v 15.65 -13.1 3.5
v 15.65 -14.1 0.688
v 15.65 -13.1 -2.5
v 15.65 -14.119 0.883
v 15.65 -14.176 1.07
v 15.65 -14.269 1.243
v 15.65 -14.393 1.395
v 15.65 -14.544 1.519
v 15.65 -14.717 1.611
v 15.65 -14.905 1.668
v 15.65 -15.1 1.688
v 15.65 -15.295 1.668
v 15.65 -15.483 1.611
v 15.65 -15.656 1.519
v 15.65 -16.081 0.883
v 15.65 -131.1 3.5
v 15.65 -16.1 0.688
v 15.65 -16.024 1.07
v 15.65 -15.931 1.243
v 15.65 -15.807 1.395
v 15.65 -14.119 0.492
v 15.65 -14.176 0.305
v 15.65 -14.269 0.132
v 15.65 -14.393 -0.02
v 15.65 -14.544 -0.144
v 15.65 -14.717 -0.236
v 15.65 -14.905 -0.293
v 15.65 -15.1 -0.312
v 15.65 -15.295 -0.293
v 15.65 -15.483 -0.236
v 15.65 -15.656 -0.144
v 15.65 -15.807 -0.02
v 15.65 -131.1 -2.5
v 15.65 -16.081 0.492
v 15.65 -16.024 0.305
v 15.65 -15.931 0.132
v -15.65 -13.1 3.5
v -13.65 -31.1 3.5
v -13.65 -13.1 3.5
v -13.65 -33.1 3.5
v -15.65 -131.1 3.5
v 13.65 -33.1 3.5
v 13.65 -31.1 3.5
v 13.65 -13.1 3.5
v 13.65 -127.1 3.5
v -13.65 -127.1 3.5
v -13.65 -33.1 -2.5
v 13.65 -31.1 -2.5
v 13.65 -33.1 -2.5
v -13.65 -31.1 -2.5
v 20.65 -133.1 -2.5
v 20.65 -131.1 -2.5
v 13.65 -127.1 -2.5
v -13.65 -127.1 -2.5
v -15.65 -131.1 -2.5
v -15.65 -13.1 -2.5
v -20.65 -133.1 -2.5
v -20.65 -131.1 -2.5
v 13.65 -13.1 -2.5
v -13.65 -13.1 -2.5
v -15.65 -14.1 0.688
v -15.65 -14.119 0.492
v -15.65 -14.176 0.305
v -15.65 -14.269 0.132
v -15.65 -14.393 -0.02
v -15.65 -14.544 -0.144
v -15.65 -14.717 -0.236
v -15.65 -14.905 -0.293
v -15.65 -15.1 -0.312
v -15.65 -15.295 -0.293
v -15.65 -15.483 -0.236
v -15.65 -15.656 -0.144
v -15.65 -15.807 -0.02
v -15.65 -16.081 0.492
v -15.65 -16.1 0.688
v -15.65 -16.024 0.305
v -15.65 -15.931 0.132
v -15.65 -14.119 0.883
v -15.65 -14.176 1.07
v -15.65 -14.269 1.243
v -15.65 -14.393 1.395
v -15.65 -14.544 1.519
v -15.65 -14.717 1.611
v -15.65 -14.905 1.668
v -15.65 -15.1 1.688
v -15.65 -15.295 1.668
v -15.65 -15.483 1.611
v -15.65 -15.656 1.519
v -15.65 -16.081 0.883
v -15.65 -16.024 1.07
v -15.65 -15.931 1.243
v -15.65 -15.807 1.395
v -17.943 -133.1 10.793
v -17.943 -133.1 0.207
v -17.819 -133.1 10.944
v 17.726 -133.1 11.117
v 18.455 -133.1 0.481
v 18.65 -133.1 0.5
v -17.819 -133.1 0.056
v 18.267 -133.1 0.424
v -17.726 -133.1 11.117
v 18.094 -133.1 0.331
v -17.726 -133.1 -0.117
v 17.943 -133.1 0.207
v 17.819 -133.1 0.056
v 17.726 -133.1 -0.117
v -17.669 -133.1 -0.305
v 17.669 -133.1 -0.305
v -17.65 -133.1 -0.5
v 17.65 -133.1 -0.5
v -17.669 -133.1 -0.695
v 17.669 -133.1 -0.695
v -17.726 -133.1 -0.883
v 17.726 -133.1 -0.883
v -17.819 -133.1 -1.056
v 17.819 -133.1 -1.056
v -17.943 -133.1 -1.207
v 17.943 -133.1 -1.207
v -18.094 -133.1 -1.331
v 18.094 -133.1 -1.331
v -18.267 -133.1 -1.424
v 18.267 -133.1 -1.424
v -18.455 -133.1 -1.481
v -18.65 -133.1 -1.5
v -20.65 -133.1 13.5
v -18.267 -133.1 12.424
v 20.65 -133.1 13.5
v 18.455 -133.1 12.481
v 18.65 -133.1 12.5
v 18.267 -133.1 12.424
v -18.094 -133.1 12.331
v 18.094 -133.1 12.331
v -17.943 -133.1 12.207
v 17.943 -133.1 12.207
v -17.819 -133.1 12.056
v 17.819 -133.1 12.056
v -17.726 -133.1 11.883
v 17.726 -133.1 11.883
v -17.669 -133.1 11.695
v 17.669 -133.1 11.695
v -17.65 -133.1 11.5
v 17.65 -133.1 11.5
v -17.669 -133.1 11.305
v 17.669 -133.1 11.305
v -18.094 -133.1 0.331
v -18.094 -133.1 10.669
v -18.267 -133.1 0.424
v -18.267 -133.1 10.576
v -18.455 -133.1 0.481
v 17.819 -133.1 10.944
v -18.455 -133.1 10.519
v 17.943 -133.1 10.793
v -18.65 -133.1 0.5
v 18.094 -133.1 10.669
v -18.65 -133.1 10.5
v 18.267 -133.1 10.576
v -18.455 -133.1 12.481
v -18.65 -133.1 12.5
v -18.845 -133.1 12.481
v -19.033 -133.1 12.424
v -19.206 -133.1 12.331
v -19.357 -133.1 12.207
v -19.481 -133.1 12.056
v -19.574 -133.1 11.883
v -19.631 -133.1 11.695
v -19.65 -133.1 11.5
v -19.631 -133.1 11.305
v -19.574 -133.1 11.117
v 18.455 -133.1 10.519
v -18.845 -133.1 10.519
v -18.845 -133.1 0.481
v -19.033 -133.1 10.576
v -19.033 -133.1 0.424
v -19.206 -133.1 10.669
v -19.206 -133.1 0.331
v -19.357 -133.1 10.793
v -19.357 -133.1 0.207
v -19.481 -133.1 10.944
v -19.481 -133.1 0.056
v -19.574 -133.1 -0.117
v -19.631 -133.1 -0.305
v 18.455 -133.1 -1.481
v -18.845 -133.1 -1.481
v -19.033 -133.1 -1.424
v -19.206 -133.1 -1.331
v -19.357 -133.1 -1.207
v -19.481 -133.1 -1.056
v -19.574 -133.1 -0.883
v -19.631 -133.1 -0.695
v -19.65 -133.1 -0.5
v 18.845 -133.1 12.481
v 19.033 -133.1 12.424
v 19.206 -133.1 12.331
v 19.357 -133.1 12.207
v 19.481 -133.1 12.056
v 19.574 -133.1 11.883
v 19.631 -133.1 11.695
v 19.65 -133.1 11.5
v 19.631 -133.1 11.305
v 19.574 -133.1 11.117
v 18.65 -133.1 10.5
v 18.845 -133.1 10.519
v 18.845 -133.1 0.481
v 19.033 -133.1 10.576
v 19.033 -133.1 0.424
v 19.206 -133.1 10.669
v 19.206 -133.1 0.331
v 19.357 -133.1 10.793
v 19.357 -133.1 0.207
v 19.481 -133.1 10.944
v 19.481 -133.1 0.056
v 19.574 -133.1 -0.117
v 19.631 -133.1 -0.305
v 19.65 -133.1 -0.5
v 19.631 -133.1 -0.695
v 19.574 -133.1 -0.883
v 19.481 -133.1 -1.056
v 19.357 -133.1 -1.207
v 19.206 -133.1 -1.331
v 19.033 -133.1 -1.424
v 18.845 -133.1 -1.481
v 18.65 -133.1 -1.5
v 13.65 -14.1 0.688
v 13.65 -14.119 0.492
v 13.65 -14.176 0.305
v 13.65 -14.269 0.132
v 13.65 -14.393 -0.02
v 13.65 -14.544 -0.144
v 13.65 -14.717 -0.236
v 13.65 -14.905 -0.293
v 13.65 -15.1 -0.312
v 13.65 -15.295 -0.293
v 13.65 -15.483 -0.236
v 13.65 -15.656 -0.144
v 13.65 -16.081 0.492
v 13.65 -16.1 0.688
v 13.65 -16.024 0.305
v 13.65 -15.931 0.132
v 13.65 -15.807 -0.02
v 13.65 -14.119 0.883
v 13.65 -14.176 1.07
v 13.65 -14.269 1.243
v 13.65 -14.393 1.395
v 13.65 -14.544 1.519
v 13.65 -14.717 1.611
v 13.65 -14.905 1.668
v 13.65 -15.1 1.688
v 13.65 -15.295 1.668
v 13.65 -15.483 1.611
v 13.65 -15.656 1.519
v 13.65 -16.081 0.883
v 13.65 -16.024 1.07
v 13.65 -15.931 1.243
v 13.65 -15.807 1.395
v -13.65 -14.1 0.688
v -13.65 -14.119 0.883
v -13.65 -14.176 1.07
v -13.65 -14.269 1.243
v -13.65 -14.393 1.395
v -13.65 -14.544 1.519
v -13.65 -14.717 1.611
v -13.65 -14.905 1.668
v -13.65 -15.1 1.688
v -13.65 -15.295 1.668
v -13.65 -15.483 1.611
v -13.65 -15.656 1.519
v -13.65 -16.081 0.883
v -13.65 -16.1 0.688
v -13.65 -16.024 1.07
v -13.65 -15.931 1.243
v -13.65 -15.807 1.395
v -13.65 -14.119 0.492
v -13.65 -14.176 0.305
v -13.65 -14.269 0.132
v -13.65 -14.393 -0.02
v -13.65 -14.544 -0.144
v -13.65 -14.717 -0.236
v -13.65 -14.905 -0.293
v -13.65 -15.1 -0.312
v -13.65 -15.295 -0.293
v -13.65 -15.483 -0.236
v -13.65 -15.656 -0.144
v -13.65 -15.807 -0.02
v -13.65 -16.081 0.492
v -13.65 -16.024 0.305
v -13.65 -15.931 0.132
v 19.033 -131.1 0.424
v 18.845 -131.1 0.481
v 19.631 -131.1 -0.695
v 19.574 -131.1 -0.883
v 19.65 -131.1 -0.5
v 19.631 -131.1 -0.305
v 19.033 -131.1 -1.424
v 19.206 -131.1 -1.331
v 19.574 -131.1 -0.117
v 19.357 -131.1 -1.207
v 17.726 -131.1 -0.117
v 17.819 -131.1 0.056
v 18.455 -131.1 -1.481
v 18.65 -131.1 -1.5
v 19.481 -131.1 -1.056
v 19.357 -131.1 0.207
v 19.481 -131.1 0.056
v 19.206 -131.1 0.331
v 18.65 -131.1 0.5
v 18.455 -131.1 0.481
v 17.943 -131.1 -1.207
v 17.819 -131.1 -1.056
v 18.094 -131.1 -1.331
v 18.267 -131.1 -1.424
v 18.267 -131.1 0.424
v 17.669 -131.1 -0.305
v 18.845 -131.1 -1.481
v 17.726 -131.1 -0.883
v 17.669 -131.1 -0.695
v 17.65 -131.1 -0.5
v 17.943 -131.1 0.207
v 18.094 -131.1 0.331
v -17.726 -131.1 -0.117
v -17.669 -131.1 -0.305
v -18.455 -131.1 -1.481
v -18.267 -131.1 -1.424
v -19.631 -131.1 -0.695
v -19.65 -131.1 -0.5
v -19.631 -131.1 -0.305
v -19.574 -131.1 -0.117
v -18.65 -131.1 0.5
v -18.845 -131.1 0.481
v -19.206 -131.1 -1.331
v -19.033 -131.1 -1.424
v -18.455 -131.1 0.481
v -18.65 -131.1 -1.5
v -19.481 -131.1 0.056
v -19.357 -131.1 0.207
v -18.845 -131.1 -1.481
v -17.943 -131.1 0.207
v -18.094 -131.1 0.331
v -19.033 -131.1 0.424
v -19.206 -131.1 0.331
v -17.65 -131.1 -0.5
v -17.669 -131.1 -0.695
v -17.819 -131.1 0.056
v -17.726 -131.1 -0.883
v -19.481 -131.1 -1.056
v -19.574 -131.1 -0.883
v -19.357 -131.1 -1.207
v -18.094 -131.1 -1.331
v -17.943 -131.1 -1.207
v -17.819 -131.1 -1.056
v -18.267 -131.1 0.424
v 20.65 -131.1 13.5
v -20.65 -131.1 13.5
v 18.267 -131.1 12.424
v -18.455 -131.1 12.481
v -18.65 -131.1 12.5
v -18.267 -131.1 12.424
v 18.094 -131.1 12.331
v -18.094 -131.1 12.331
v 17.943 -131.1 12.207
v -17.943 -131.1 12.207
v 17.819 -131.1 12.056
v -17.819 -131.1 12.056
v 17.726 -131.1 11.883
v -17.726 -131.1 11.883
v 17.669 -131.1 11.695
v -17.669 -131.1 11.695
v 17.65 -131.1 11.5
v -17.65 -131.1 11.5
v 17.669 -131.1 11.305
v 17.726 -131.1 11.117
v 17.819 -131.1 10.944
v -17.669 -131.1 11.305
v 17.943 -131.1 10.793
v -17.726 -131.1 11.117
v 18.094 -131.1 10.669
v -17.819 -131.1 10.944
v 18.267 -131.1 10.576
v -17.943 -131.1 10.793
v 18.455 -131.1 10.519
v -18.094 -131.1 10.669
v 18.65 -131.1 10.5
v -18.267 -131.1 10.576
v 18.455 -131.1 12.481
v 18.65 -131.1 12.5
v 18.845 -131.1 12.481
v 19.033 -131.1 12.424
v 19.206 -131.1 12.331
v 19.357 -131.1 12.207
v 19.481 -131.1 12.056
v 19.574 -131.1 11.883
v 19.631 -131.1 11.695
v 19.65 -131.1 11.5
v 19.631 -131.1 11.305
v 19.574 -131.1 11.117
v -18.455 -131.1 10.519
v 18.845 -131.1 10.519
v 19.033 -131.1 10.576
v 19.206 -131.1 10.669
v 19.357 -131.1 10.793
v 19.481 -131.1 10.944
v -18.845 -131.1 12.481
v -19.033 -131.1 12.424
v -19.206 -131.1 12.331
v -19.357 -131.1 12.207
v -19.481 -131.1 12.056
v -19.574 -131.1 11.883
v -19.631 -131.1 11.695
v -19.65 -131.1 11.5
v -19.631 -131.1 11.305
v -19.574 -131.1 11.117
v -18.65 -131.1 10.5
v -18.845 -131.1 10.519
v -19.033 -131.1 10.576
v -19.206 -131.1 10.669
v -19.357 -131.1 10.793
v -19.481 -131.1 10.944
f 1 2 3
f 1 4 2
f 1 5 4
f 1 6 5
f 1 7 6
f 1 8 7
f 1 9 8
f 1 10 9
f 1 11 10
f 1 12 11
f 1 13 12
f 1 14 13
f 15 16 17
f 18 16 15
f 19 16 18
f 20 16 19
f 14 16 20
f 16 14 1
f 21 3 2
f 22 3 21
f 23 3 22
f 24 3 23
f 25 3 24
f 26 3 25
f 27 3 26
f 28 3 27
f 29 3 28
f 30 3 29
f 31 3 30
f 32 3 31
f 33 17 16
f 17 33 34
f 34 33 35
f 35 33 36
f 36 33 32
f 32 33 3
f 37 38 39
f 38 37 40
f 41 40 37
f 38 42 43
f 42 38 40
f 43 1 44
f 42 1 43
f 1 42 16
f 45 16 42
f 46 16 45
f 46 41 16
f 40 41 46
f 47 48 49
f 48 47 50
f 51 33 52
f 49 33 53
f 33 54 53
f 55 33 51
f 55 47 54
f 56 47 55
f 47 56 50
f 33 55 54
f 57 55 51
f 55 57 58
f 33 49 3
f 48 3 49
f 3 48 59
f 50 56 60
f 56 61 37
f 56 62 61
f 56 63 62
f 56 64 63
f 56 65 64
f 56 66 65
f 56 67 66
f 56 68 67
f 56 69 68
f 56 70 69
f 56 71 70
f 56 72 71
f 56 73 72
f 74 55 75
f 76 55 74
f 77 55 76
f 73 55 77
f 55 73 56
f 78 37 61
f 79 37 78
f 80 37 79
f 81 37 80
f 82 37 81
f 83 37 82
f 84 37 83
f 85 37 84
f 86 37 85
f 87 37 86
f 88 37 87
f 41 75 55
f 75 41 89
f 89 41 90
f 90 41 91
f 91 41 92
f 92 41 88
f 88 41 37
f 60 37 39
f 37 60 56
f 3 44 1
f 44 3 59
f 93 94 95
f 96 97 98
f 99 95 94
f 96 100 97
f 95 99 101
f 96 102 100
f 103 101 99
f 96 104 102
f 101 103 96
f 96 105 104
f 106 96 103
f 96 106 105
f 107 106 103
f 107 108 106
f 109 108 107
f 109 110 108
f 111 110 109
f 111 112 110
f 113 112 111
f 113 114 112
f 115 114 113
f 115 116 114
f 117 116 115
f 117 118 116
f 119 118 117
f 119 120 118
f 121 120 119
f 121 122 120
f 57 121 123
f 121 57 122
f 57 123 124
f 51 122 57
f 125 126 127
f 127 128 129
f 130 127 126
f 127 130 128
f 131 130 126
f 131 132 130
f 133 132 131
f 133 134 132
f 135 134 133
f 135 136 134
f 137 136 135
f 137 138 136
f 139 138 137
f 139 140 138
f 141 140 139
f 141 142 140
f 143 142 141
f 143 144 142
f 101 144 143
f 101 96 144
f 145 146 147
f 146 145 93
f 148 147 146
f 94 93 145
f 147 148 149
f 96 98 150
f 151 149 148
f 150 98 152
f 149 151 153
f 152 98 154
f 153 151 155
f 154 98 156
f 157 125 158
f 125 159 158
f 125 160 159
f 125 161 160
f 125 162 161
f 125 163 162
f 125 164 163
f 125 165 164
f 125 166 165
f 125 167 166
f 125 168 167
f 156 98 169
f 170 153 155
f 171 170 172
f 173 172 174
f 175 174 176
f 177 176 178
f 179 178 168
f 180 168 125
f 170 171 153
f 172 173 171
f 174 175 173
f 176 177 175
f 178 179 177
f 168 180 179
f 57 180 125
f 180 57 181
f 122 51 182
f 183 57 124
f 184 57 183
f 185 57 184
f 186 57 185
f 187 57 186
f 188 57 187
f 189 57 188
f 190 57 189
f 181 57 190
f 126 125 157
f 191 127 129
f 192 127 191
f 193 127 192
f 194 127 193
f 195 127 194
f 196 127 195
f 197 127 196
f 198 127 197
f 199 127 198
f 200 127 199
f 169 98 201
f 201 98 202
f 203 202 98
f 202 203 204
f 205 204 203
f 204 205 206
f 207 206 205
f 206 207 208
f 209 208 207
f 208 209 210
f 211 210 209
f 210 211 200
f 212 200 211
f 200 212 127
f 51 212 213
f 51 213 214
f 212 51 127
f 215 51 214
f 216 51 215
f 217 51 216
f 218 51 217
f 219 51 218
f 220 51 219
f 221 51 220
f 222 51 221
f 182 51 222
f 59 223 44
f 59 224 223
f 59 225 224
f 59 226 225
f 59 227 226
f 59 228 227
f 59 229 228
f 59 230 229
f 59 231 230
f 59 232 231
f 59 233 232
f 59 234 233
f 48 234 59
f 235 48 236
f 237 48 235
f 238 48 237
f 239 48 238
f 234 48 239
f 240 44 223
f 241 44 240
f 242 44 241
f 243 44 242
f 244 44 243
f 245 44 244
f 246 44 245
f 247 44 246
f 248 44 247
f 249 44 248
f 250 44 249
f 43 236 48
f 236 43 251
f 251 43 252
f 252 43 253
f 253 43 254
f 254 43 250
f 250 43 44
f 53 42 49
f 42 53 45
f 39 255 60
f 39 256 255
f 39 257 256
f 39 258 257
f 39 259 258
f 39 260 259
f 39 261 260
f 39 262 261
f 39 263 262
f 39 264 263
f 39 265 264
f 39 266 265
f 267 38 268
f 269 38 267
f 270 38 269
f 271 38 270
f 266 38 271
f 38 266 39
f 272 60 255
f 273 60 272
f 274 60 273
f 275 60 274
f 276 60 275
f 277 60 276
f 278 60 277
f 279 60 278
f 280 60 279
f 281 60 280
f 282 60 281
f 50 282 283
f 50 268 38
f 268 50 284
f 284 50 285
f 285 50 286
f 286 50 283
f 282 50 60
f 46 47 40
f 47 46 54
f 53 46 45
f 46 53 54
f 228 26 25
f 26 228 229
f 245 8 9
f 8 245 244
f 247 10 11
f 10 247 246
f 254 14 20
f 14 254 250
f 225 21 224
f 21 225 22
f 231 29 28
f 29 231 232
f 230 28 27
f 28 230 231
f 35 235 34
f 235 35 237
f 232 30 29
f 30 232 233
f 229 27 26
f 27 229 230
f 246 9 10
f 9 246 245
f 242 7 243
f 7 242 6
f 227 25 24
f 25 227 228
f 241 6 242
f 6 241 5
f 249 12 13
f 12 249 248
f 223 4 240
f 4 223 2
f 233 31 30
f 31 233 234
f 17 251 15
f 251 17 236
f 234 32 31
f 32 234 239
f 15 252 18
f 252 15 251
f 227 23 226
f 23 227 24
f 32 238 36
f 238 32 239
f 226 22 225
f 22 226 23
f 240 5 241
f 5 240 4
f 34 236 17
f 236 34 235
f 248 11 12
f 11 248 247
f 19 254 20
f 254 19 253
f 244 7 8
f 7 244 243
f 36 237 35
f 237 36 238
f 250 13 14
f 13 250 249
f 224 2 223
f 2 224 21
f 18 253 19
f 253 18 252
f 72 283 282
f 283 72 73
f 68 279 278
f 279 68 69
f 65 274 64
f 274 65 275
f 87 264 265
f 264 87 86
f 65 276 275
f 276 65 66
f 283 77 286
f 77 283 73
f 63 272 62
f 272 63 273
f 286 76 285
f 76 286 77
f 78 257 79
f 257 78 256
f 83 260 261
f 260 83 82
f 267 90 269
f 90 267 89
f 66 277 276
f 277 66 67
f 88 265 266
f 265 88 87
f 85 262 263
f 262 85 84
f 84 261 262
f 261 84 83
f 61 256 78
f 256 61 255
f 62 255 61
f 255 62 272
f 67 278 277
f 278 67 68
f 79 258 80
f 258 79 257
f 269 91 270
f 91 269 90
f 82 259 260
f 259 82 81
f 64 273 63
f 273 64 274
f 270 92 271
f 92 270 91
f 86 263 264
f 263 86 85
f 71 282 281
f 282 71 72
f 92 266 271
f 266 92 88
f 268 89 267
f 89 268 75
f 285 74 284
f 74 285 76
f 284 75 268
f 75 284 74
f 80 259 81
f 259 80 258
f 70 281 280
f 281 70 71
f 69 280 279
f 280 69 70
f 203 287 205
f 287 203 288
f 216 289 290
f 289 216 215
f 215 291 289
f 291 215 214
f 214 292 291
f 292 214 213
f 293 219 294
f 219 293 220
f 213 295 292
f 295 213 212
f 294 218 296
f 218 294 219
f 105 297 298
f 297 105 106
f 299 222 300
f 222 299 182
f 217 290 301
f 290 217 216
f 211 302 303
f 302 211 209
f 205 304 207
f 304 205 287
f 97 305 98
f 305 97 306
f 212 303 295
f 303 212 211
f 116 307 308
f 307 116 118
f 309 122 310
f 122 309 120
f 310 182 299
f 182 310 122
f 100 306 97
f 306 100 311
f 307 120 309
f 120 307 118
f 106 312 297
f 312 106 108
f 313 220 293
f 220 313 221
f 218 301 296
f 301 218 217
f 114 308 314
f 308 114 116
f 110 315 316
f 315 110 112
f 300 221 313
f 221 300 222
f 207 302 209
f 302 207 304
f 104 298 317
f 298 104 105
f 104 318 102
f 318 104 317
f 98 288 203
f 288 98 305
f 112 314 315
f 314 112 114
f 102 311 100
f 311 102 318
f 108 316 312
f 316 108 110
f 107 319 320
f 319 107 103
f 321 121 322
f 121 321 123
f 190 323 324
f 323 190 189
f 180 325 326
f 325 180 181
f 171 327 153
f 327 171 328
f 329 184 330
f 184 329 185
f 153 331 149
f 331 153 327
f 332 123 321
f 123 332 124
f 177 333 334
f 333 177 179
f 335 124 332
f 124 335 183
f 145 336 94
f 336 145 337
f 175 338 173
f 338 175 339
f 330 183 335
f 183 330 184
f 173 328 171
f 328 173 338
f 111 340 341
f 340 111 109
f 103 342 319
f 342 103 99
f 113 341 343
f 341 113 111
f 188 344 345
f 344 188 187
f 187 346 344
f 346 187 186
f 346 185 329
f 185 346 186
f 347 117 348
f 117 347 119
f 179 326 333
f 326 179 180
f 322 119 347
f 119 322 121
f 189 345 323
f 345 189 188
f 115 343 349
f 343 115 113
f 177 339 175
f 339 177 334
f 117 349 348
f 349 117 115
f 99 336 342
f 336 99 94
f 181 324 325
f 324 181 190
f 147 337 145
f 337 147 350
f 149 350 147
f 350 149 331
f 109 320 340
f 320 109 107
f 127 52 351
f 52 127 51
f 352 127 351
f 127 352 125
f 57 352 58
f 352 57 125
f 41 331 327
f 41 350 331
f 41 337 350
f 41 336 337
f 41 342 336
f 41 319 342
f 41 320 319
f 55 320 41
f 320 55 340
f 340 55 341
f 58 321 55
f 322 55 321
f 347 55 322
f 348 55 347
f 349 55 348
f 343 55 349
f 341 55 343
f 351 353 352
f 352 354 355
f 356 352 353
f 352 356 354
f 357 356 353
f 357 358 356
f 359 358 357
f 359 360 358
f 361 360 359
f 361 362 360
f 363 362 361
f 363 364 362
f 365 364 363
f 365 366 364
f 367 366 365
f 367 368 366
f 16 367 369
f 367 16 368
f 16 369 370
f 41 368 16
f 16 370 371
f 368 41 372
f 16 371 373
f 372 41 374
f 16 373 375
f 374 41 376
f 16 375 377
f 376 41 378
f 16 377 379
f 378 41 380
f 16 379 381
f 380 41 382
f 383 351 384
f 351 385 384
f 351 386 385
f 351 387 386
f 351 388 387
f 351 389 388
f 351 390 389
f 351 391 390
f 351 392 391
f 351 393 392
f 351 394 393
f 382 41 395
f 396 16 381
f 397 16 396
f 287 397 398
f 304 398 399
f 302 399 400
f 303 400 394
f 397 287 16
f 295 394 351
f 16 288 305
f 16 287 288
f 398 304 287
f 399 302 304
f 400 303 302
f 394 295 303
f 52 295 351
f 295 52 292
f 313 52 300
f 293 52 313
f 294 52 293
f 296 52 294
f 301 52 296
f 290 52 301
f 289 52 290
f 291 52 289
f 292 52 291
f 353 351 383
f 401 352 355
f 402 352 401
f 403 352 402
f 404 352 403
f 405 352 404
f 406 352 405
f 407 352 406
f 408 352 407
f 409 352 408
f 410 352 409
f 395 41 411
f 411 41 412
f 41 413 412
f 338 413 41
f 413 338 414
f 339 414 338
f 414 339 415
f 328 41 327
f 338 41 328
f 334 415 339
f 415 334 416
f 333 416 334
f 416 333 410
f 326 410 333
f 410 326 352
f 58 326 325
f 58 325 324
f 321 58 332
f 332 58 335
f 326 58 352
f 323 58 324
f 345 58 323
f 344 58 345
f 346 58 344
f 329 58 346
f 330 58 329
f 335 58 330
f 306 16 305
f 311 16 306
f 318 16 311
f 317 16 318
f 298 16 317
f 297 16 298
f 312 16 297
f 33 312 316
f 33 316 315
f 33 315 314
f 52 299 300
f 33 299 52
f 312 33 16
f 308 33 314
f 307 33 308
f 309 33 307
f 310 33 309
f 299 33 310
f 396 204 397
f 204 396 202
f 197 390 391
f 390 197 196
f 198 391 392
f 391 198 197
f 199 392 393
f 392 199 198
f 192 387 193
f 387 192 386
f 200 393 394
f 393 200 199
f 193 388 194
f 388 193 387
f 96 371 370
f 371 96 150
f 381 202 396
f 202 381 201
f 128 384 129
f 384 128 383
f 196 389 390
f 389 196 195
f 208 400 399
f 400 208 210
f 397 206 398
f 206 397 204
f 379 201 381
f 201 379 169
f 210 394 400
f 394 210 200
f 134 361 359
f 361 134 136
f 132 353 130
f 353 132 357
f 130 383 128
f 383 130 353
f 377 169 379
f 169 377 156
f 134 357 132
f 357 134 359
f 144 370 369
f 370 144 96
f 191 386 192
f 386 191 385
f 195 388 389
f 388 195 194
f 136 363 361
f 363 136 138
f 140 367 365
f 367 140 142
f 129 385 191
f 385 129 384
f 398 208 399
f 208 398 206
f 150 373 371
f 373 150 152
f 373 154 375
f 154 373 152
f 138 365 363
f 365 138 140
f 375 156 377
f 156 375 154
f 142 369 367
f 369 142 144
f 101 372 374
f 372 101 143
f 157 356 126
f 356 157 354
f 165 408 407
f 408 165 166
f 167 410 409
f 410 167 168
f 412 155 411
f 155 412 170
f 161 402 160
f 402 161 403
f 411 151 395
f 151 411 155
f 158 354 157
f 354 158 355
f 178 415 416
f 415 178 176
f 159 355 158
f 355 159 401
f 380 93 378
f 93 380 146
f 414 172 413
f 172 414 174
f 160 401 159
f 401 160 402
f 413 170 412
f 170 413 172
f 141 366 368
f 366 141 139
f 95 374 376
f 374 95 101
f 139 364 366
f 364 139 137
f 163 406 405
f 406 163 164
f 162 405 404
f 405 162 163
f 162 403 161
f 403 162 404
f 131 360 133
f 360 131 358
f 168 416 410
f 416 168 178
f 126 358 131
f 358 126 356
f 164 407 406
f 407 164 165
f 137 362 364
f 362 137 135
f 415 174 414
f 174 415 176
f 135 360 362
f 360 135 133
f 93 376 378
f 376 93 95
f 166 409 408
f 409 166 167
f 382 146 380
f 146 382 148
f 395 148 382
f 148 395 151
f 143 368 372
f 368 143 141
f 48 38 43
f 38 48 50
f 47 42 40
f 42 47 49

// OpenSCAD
CAMERA_WIDTH = 25.3;
CAMERA_LENGTH = 24.2;
CAMERA_PCB_HEIGHT = 1.7;
CAMERA_PCB_AND_RIBBON_HEIGHT = 4.45;

TOP_THROUGH_HOLE_MARGIN = 1;
THROUGH_HOLE_RADIUS = 1;

// Lens is a box shape
LENS_SIZE = 8.7;
LENS_OFFSET_Y = 11.7;

// Depth of back enclosure + PCB
BACK_AND_PCB_DEPTH = 5.6;

MOUNTING_SPACE = 4;
MOUNTING_SCREW_DIAMETER = 2;

// translate([0, 0, 2]) {
//     difference() {
//         cube([CAMERA_WIDTH, CAMERA_LENGTH, 1], center=true);

//         translate([0, CAMERA_LENGTH/2 - LENS_SIZE/2 - LENS_OFFSET_Y + 1.5, 0]) {
//             cube([LENS_SIZE, LENS_SIZE, 2], center=true);
//         }
//     }
// }


pcb_leeway = CAMERA_PCB_AND_RIBBON_HEIGHT - CAMERA_PCB_HEIGHT;
chasis_depth = pcb_leeway + 1;

module mounting_screw_hole_left() {
    translate([CAMERA_WIDTH/2, -CAMERA_LENGTH/2 - MOUNTING_SPACE/2 - 1, chasis_depth/4 - 0.25]) {
        rotate([0, 90, 0]) {
            cylinder(3, MOUNTING_SCREW_DIAMETER/2, MOUNTING_SCREW_DIAMETER/2, center=true, $fn=32);
        }
    }
}


STAND_HEIGHT = 120;
STAND_DEPTH = 6;

difference() {
    translate([0, -CAMERA_LENGTH/2 - MOUNTING_SPACE/2 + 1 + -STAND_HEIGHT/2, 2- STAND_DEPTH/4]) {
        difference() {
            cube([CAMERA_WIDTH + 6, STAND_HEIGHT, STAND_DEPTH], center=true);
            translate([0, 4, 0]) {
                cube([CAMERA_WIDTH + 2, STAND_HEIGHT - 4, STAND_DEPTH + 1], center=true);
            }
        }
    }
    translate([2, 0, 0]) {
        mounting_screw_hole_left();
    }
    
    mirror([1, 0, 0]) {
        translate([2, 0, 0]) {
            mounting_screw_hole_left();
        }
    }
}

module stand_screw_hole() {
    translate([CAMERA_WIDTH/2 + 6, 0, (STAND_DEPTH + 10)/2 - 2]) {
        rotate([90, 0, 0]) {
            cylinder(3, MOUNTING_SCREW_DIAMETER/2, MOUNTING_SCREW_DIAMETER/2, center=true, $fn=32);
        }
    }
}

translate([0, -MOUNTING_SPACE -CAMERA_LENGTH/2  - 16, 2- STAND_DEPTH/4]) {
    cube([CAMERA_WIDTH + 4, 2, STAND_DEPTH], center=true);
}

translate([0, -STAND_HEIGHT -CAMERA_LENGTH/2, 2- STAND_DEPTH/4 + 5]) {

    // Stand
    difference() {
        cube([CAMERA_WIDTH + 16, 2, STAND_DEPTH + 10], center=true);
        stand_screw_hole();
        mirror([1, 0, 0]) {
            stand_screw_hole();
        }
        mirror([0, 0, 1]) {
            stand_screw_hole();
            mirror([1, 0, 0]) {
                stand_screw_hole();
            }   
        }
    }
}
